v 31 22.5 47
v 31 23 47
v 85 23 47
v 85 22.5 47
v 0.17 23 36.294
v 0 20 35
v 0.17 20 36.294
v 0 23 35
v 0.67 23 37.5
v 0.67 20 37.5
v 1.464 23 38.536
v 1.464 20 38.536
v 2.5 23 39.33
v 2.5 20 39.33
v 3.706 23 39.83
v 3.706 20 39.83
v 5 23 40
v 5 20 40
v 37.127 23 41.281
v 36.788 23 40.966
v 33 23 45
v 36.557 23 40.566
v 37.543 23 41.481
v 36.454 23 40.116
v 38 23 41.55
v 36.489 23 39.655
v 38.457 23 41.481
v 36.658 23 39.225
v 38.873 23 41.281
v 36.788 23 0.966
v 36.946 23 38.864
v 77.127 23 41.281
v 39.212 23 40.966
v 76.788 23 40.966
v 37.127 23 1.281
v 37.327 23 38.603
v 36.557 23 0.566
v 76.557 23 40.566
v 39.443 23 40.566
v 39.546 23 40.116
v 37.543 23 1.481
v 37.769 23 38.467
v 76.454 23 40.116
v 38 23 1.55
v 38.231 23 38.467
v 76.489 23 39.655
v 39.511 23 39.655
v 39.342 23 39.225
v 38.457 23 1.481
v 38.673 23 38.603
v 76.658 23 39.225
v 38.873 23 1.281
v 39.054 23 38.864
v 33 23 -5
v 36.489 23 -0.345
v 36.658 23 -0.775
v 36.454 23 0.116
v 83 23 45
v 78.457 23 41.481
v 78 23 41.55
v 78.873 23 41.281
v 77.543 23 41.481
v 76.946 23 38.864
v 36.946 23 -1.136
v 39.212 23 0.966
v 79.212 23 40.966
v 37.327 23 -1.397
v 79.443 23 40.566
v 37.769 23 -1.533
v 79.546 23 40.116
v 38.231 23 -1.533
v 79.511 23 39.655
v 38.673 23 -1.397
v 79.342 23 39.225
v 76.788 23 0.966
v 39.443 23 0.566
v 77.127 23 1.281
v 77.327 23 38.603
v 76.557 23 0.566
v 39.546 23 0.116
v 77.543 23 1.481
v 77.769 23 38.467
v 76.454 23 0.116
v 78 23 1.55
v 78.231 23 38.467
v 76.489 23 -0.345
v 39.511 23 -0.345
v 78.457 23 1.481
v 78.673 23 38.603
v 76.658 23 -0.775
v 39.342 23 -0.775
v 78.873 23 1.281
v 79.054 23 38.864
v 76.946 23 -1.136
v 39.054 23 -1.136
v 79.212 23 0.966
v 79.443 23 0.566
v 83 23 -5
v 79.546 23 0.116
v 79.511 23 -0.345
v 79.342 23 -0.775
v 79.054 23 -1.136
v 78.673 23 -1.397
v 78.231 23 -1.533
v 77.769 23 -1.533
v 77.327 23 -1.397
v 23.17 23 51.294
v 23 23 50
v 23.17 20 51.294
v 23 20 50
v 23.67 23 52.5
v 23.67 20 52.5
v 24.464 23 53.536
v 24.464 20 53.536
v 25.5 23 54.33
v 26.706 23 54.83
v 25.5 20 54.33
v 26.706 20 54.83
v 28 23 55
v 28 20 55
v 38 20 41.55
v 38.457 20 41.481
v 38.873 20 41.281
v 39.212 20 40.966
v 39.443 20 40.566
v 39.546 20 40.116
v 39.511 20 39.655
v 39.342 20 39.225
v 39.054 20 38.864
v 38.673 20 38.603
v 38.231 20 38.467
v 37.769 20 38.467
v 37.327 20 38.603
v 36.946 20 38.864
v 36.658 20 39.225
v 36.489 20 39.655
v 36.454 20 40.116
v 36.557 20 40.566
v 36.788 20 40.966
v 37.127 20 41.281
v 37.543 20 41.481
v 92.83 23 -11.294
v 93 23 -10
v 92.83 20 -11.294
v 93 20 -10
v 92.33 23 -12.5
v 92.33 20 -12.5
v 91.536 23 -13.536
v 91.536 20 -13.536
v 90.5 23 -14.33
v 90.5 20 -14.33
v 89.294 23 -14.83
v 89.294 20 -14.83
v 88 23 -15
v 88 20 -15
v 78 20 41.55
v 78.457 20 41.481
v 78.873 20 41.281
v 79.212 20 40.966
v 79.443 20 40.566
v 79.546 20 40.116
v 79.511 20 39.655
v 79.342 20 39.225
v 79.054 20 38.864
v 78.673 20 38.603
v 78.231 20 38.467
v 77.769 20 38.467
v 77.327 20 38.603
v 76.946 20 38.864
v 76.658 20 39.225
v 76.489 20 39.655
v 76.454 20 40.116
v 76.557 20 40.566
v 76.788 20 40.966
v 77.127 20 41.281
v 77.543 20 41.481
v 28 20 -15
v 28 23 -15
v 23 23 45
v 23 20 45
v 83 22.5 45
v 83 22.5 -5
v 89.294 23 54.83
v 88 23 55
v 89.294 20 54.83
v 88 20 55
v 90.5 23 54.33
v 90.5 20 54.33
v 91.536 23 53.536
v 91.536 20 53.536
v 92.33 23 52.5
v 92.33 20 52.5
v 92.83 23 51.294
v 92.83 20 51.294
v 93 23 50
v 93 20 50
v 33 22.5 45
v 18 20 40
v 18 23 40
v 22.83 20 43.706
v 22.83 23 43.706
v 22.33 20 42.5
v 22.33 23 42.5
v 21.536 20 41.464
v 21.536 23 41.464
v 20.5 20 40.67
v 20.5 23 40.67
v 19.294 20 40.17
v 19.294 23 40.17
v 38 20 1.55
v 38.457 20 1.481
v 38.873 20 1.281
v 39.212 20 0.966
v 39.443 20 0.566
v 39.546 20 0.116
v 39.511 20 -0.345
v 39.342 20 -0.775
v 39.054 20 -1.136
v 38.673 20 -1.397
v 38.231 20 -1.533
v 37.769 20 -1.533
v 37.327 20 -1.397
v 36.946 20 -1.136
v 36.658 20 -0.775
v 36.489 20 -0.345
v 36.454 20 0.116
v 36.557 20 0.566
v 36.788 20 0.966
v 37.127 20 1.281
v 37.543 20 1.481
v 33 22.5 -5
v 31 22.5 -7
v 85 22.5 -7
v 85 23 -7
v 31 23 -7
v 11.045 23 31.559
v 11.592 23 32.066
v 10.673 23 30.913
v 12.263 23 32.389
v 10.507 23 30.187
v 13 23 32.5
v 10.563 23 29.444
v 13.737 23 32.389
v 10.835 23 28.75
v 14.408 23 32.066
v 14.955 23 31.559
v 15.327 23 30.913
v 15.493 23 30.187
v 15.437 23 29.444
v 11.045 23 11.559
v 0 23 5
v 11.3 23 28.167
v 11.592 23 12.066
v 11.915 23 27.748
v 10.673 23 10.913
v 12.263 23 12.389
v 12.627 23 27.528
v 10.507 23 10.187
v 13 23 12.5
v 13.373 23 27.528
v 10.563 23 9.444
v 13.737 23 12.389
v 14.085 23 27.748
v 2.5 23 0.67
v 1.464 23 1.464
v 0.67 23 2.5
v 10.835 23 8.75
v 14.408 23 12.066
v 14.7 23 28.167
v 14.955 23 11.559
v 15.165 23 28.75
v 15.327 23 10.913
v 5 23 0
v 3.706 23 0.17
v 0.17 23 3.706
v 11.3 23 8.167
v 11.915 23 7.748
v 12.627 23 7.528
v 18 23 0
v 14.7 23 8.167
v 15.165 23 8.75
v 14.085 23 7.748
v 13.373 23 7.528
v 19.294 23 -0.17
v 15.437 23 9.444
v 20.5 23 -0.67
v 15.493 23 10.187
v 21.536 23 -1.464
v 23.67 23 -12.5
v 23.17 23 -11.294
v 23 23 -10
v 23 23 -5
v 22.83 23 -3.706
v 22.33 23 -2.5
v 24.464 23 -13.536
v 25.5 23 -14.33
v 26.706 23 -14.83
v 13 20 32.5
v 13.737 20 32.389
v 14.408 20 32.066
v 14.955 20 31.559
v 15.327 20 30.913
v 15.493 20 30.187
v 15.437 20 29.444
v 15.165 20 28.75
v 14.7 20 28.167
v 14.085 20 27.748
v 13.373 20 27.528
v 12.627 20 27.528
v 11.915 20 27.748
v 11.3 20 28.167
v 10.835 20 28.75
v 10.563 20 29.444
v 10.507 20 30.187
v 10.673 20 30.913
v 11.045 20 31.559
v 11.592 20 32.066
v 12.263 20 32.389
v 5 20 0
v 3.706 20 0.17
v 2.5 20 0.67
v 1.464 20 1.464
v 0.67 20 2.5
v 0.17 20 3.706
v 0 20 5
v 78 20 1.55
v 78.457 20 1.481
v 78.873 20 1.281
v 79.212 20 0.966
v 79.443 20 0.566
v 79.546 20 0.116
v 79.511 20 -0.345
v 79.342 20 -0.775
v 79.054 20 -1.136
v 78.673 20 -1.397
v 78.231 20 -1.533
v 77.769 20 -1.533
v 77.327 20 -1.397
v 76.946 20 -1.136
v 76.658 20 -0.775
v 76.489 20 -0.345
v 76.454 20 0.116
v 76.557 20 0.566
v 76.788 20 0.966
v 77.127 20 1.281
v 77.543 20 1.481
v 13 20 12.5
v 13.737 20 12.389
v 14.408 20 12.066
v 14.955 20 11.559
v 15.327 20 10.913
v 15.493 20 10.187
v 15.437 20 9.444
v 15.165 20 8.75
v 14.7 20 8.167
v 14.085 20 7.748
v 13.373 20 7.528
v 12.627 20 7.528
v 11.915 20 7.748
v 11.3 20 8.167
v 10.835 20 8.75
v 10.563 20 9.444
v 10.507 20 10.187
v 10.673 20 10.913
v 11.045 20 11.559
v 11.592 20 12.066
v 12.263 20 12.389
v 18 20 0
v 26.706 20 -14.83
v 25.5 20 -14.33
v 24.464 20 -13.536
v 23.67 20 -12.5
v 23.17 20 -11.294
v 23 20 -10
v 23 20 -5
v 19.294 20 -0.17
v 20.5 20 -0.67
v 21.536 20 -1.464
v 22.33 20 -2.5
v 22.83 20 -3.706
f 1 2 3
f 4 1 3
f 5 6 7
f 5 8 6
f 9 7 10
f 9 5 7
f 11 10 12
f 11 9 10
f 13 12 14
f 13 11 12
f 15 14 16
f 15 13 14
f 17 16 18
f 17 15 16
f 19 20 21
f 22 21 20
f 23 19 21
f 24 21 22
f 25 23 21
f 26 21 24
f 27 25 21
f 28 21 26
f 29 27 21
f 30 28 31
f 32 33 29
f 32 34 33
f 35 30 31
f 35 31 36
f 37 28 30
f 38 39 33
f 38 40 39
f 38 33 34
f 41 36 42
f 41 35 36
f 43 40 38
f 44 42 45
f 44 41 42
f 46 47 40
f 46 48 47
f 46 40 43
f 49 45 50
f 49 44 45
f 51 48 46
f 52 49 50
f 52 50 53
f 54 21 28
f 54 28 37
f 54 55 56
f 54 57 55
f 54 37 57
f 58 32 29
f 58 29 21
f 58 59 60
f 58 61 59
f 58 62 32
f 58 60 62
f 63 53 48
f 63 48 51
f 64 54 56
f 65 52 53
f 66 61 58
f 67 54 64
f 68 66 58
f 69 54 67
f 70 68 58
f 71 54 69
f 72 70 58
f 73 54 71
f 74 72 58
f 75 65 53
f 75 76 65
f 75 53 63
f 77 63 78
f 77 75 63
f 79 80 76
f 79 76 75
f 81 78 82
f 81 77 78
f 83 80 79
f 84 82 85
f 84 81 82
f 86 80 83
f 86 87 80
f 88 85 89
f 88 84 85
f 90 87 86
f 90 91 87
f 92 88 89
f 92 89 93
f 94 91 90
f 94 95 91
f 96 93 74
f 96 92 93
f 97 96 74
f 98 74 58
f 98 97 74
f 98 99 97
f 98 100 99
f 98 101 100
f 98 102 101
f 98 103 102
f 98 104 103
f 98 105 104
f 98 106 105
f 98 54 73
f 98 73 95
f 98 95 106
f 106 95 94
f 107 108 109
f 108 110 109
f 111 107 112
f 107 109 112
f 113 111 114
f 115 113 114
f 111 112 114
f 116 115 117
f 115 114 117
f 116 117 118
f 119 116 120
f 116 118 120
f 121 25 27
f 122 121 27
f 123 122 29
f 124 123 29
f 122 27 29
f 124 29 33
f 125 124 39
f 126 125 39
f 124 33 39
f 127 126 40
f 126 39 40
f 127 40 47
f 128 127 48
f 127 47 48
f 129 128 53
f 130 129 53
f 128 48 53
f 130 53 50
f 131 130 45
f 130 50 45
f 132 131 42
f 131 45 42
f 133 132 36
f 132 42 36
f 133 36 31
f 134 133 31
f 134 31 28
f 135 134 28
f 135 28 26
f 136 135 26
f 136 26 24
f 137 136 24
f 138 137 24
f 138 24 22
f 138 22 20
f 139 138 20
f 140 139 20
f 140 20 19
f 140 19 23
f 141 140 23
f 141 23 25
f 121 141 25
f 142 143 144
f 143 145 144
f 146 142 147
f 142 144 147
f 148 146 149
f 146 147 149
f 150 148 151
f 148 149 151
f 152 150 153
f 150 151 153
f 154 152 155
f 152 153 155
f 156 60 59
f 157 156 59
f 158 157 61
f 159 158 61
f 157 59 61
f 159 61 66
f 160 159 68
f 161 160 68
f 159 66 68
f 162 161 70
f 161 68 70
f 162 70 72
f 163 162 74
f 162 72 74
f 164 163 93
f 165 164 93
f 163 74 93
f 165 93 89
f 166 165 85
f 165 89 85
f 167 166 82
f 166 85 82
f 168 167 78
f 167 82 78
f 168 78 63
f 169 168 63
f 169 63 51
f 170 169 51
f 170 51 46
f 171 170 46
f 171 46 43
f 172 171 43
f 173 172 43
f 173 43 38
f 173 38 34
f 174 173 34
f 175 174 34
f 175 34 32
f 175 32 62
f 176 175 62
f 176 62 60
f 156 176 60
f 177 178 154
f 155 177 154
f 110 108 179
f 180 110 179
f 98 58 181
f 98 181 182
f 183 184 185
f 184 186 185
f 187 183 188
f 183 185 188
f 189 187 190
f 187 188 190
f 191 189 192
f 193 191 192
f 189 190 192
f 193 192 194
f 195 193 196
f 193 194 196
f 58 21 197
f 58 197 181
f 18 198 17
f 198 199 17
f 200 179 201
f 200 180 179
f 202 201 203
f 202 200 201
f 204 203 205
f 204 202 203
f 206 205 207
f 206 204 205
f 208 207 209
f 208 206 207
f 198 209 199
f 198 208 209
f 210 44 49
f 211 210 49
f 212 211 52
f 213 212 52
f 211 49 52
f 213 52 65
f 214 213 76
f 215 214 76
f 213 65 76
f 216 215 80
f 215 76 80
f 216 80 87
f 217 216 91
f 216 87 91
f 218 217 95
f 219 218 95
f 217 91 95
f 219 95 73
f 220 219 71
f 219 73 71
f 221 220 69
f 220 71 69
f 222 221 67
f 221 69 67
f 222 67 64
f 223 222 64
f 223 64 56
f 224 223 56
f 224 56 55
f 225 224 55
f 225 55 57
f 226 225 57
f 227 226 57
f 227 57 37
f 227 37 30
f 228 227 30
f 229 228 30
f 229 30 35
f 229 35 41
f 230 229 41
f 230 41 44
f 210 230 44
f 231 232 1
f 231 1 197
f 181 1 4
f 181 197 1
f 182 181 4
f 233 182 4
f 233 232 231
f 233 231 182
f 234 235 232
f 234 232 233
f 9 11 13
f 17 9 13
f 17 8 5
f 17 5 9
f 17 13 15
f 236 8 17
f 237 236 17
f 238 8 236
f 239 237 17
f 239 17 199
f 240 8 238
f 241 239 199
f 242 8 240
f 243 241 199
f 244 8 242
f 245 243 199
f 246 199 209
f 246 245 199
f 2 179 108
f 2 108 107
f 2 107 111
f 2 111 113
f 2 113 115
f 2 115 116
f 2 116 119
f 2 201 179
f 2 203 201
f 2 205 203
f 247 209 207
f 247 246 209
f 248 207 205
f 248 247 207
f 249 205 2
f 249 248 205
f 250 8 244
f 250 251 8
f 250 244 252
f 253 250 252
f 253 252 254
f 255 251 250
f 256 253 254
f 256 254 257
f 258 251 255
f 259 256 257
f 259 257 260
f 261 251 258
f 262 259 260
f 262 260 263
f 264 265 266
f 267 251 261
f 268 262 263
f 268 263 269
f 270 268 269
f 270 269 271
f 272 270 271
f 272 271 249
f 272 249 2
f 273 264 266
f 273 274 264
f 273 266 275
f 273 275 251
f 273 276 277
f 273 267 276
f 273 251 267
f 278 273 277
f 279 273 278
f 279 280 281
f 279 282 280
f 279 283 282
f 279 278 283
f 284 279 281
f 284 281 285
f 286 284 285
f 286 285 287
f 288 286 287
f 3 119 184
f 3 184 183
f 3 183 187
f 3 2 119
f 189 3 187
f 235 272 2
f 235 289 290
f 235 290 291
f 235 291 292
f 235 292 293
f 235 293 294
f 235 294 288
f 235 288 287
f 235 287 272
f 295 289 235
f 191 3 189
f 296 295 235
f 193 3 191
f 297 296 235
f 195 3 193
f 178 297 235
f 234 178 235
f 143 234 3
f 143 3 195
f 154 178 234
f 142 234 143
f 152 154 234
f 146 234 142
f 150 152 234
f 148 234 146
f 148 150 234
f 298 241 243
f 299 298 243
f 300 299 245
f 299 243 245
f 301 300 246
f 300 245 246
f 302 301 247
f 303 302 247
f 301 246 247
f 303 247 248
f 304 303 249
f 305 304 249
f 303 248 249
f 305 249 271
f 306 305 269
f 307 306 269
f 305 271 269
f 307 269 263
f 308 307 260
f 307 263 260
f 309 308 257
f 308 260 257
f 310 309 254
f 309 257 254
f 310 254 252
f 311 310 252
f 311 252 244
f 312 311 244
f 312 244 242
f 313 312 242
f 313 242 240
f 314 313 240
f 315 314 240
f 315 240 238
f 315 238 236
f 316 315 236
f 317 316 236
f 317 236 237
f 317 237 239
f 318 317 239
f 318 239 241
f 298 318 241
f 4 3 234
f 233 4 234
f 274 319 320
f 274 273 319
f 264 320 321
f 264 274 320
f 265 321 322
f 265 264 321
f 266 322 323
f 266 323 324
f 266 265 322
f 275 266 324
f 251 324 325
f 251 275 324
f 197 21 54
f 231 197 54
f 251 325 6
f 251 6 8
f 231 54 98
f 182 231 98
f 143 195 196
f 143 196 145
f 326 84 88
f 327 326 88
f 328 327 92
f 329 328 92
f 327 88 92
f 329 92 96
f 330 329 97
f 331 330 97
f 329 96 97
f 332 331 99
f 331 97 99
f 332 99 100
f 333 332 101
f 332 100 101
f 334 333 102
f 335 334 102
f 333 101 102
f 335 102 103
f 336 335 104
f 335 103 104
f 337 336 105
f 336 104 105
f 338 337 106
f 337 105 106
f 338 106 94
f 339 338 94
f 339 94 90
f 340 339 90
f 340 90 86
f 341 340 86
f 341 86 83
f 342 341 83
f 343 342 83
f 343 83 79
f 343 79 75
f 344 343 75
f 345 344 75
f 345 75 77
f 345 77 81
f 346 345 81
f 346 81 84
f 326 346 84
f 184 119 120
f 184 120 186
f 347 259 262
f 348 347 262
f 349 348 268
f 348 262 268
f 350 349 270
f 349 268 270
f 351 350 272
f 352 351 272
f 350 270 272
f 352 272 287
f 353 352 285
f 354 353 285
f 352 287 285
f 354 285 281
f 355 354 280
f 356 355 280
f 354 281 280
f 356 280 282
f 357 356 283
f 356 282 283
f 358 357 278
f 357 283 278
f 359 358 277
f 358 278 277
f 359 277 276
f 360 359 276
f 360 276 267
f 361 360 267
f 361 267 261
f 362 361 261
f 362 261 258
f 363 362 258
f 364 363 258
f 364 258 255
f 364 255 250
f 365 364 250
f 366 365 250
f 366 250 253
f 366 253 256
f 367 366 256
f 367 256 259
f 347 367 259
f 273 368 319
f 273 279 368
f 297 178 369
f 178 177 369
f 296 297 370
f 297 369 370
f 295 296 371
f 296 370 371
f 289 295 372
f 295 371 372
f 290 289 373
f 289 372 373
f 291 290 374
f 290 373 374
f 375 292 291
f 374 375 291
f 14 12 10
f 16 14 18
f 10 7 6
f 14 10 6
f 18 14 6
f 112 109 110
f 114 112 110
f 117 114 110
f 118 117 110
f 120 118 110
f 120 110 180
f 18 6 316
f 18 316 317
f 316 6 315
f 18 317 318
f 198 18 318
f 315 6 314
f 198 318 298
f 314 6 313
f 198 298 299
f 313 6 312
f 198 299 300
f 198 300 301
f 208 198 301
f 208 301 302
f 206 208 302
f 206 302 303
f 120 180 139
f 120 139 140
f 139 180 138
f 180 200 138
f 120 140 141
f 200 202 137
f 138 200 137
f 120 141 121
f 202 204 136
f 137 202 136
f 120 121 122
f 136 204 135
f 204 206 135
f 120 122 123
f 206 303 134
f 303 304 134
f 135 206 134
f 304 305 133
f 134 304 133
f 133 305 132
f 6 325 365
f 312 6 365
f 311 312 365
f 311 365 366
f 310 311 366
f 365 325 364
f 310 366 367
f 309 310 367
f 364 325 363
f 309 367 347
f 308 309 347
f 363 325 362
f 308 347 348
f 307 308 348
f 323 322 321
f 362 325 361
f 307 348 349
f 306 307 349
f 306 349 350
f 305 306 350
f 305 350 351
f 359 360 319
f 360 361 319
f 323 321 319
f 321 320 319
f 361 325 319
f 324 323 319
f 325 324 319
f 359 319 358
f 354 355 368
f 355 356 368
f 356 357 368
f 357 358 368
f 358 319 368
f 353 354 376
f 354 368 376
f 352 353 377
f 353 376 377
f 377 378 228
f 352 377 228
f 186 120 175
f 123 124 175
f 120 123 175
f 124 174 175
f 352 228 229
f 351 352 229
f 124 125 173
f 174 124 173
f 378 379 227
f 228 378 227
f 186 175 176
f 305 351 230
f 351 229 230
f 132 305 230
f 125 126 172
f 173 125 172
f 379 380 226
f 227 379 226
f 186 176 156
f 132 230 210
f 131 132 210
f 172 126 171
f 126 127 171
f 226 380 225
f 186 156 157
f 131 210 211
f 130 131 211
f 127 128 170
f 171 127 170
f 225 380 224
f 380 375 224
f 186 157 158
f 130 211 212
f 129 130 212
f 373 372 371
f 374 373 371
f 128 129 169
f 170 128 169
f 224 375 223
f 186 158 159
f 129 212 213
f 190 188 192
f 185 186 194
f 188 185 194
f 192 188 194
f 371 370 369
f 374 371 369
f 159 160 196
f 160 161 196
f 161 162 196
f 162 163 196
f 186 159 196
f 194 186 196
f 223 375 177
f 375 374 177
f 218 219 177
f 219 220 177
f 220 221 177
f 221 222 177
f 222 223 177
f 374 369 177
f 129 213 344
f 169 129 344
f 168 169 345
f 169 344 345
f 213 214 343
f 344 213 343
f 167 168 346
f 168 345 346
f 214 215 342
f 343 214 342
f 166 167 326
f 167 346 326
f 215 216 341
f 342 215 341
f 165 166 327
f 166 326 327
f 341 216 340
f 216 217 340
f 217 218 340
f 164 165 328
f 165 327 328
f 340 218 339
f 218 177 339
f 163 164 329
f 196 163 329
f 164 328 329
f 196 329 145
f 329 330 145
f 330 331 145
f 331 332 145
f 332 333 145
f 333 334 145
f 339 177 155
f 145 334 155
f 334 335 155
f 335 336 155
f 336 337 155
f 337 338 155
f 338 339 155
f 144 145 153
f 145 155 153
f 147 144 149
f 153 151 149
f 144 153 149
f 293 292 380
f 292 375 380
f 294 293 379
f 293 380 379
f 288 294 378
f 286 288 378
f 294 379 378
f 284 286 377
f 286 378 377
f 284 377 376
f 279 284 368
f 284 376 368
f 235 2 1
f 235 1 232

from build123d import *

# Parameters (mm, degrees)
BOSS_EXTRUDE1_DEPTH = 40
CUT_EXTRUDE1_REACH  = 53.556
SKETCH2_R           = 2.5
CUT_EXTRUDE2_REACH  = 53.556
SKETCH3_R           = 2.5
SKETCH4_W           = 70
SKETCH4_H           = 70
BOSS_EXTRUDE2_DEPTH = 3
SKETCH8_W           = 54
SKETCH8_H           = 54
SKETCH8_W_2         = 50
SKETCH8_H_2         = 50
CUT_EXTRUDE7_DEPTH  = 0.5
CUT_EXTRUDE8_REACH  = 112.467
SKETCH9_R           = 1.55
CUT_EXTRUDE9_REACH  = 112.467
SKETCH10_W          = 40
SKETCH10_H          = 20
FILLET1_R           = 5


with BuildPart() as part:
    # Sketch1 → Boss-Extrude1 (new body)
    with BuildSketch(Plane.XY):
        Polygon((0, 0), (0, 23), (23, 23), (23, 20), (3, 20), (3, 0), align=None)
    extrude(amount=BOSS_EXTRUDE1_DEPTH)

    # Sketch2 → Cut-Extrude1 (cut, up to next)
    with BuildSketch(Plane(origin=(0, 23, 0), x_dir=(1, 0, 0), z_dir=(0, 1, 0)), mode=Mode.PRIVATE) as cut_extrude1_sk1:
        with Locations(Location((13, -10, 0), (0, 0, 270))):
            Circle(SKETCH2_R)
    cut_extrude1_tool1 = extrude(cut_extrude1_sk1.sketch, amount=-CUT_EXTRUDE1_REACH, mode=Mode.PRIVATE) & part.part
    # Sketch2 → Cut-Extrude1 (cut, up to next)
    with BuildSketch(Plane(origin=(0, 23, 0), x_dir=(1, 0, 0), z_dir=(0, 1, 0)), mode=Mode.PRIVATE) as cut_extrude1_sk2:
        with Locations(Location((13, -30, 0), (0, 0, 270))):
            Circle(SKETCH2_R)
    cut_extrude1_tool2 = extrude(cut_extrude1_sk2.sketch, amount=-CUT_EXTRUDE1_REACH, mode=Mode.PRIVATE) & part.part
    add(cut_extrude1_tool1.solids().sort_by_distance((13, 23, 10))[0], mode=Mode.SUBTRACT)
    add(cut_extrude1_tool2.solids().sort_by_distance((13, 23, 30))[0], mode=Mode.SUBTRACT)

    # Sketch3 → Cut-Extrude2 (cut, up to next)
    with BuildSketch(Plane.ZY, mode=Mode.PRIVATE) as cut_extrude2_sk1:
        with Locations((10, 10)):
            Circle(SKETCH3_R)
    cut_extrude2_tool1 = extrude(cut_extrude2_sk1.sketch, amount=-CUT_EXTRUDE2_REACH, mode=Mode.PRIVATE) & part.part
    # Sketch3 → Cut-Extrude2 (cut, up to next)
    with BuildSketch(Plane.ZY, mode=Mode.PRIVATE) as cut_extrude2_sk2:
        with Locations((30, 10)):
            Circle(SKETCH3_R)
    cut_extrude2_tool2 = extrude(cut_extrude2_sk2.sketch, amount=-CUT_EXTRUDE2_REACH, mode=Mode.PRIVATE) & part.part
    add(cut_extrude2_tool1.solids().sort_by_distance((0, 10, 10))[0], mode=Mode.SUBTRACT)
    add(cut_extrude2_tool2.solids().sort_by_distance((0, 10, 30))[0], mode=Mode.SUBTRACT)

    # Sketch4 → Boss-Extrude2 (add)
    with BuildSketch(Plane(origin=(0, 23, 0), x_dir=(1, 0, 0), z_dir=(0, 1, 0))):
        with Locations((58, -20)):
            Rectangle(SKETCH4_W, SKETCH4_H)
    extrude(amount=-BOSS_EXTRUDE2_DEPTH)

    # Sketch8 → Cut-Extrude7 (cut)
    with BuildSketch(Plane(origin=(0, 23, 0), x_dir=(1, 0, 0), z_dir=(0, 1, 0))):
        with Locations((58, -20)):
            Rectangle(SKETCH8_W, SKETCH8_H)
        with Locations((58, -20)):
            Rectangle(SKETCH8_W_2, SKETCH8_H_2, mode=Mode.SUBTRACT)
    extrude(amount=-CUT_EXTRUDE7_DEPTH, mode=Mode.SUBTRACT)

    # Sketch9 → Cut-Extrude8 (cut, up to next)
    with BuildSketch(Plane(origin=(0, 23, 0), x_dir=(1, 0, 0), z_dir=(0, 1, 0)), mode=Mode.PRIVATE) as cut_extrude8_sk1:
        with Locations(Location((38, -40, 0), (0, 0, 270))):
            Circle(SKETCH9_R)
    cut_extrude8_tool1 = extrude(cut_extrude8_sk1.sketch, amount=-CUT_EXTRUDE8_REACH, mode=Mode.PRIVATE) & part.part
    # Sketch9 → Cut-Extrude8 (cut, up to next)
    with BuildSketch(Plane(origin=(0, 23, 0), x_dir=(1, 0, 0), z_dir=(0, 1, 0)), mode=Mode.PRIVATE) as cut_extrude8_sk2:
        with Locations(Location((38, 0, 0), (0, 0, 270))):
            Circle(SKETCH9_R)
    cut_extrude8_tool2 = extrude(cut_extrude8_sk2.sketch, amount=-CUT_EXTRUDE8_REACH, mode=Mode.PRIVATE) & part.part
    # Sketch9 → Cut-Extrude8 (cut, up to next)
    with BuildSketch(Plane(origin=(0, 23, 0), x_dir=(1, 0, 0), z_dir=(0, 1, 0)), mode=Mode.PRIVATE) as cut_extrude8_sk3:
        with Locations(Location((78, 0, 0), (0, 0, 270))):
            Circle(SKETCH9_R)
    cut_extrude8_tool3 = extrude(cut_extrude8_sk3.sketch, amount=-CUT_EXTRUDE8_REACH, mode=Mode.PRIVATE) & part.part
    # Sketch9 → Cut-Extrude8 (cut, up to next)
    with BuildSketch(Plane(origin=(0, 23, 0), x_dir=(1, 0, 0), z_dir=(0, 1, 0)), mode=Mode.PRIVATE) as cut_extrude8_sk4:
        with Locations(Location((78, -40, 0), (0, 0, 270))):
            Circle(SKETCH9_R)
    cut_extrude8_tool4 = extrude(cut_extrude8_sk4.sketch, amount=-CUT_EXTRUDE8_REACH, mode=Mode.PRIVATE) & part.part
    add(cut_extrude8_tool1.solids().sort_by_distance((38, 23, 40))[0], mode=Mode.SUBTRACT)
    add(cut_extrude8_tool2.solids().sort_by_distance((38, 23, 0))[0], mode=Mode.SUBTRACT)
    add(cut_extrude8_tool3.solids().sort_by_distance((78, 23, 0))[0], mode=Mode.SUBTRACT)
    add(cut_extrude8_tool4.solids().sort_by_distance((78, 23, 40))[0], mode=Mode.SUBTRACT)

    # Sketch10 → Cut-Extrude9 (cut, up to next)
    with BuildSketch(Plane.ZY, mode=Mode.PRIVATE) as cut_extrude9_sk1:
        with Locations((20, 10)):
            Rectangle(SKETCH10_W, SKETCH10_H)
    cut_extrude9_tool1 = extrude(cut_extrude9_sk1.sketch, amount=-CUT_EXTRUDE9_REACH, mode=Mode.PRIVATE) & part.part
    add(cut_extrude9_tool1.solids().sort_by_distance((0, 10, 20))[0], mode=Mode.SUBTRACT)

    # Fillet1
    fillet1_edges = [part.edges().sort_by_distance(p)[0] for p in [
        (23, 21.5, 40),
        (0, 21.5, 40),
        (23, 21.5, 55),
        (23, 21.5, -15),
        (93, 21.5, -15),
        (93, 21.5, 55),
        (0, 21.5, 0),
        (23, 21.5, 0),
    ]]
    fillet(fillet1_edges, radius=FILLET1_R)


solid = part.part
